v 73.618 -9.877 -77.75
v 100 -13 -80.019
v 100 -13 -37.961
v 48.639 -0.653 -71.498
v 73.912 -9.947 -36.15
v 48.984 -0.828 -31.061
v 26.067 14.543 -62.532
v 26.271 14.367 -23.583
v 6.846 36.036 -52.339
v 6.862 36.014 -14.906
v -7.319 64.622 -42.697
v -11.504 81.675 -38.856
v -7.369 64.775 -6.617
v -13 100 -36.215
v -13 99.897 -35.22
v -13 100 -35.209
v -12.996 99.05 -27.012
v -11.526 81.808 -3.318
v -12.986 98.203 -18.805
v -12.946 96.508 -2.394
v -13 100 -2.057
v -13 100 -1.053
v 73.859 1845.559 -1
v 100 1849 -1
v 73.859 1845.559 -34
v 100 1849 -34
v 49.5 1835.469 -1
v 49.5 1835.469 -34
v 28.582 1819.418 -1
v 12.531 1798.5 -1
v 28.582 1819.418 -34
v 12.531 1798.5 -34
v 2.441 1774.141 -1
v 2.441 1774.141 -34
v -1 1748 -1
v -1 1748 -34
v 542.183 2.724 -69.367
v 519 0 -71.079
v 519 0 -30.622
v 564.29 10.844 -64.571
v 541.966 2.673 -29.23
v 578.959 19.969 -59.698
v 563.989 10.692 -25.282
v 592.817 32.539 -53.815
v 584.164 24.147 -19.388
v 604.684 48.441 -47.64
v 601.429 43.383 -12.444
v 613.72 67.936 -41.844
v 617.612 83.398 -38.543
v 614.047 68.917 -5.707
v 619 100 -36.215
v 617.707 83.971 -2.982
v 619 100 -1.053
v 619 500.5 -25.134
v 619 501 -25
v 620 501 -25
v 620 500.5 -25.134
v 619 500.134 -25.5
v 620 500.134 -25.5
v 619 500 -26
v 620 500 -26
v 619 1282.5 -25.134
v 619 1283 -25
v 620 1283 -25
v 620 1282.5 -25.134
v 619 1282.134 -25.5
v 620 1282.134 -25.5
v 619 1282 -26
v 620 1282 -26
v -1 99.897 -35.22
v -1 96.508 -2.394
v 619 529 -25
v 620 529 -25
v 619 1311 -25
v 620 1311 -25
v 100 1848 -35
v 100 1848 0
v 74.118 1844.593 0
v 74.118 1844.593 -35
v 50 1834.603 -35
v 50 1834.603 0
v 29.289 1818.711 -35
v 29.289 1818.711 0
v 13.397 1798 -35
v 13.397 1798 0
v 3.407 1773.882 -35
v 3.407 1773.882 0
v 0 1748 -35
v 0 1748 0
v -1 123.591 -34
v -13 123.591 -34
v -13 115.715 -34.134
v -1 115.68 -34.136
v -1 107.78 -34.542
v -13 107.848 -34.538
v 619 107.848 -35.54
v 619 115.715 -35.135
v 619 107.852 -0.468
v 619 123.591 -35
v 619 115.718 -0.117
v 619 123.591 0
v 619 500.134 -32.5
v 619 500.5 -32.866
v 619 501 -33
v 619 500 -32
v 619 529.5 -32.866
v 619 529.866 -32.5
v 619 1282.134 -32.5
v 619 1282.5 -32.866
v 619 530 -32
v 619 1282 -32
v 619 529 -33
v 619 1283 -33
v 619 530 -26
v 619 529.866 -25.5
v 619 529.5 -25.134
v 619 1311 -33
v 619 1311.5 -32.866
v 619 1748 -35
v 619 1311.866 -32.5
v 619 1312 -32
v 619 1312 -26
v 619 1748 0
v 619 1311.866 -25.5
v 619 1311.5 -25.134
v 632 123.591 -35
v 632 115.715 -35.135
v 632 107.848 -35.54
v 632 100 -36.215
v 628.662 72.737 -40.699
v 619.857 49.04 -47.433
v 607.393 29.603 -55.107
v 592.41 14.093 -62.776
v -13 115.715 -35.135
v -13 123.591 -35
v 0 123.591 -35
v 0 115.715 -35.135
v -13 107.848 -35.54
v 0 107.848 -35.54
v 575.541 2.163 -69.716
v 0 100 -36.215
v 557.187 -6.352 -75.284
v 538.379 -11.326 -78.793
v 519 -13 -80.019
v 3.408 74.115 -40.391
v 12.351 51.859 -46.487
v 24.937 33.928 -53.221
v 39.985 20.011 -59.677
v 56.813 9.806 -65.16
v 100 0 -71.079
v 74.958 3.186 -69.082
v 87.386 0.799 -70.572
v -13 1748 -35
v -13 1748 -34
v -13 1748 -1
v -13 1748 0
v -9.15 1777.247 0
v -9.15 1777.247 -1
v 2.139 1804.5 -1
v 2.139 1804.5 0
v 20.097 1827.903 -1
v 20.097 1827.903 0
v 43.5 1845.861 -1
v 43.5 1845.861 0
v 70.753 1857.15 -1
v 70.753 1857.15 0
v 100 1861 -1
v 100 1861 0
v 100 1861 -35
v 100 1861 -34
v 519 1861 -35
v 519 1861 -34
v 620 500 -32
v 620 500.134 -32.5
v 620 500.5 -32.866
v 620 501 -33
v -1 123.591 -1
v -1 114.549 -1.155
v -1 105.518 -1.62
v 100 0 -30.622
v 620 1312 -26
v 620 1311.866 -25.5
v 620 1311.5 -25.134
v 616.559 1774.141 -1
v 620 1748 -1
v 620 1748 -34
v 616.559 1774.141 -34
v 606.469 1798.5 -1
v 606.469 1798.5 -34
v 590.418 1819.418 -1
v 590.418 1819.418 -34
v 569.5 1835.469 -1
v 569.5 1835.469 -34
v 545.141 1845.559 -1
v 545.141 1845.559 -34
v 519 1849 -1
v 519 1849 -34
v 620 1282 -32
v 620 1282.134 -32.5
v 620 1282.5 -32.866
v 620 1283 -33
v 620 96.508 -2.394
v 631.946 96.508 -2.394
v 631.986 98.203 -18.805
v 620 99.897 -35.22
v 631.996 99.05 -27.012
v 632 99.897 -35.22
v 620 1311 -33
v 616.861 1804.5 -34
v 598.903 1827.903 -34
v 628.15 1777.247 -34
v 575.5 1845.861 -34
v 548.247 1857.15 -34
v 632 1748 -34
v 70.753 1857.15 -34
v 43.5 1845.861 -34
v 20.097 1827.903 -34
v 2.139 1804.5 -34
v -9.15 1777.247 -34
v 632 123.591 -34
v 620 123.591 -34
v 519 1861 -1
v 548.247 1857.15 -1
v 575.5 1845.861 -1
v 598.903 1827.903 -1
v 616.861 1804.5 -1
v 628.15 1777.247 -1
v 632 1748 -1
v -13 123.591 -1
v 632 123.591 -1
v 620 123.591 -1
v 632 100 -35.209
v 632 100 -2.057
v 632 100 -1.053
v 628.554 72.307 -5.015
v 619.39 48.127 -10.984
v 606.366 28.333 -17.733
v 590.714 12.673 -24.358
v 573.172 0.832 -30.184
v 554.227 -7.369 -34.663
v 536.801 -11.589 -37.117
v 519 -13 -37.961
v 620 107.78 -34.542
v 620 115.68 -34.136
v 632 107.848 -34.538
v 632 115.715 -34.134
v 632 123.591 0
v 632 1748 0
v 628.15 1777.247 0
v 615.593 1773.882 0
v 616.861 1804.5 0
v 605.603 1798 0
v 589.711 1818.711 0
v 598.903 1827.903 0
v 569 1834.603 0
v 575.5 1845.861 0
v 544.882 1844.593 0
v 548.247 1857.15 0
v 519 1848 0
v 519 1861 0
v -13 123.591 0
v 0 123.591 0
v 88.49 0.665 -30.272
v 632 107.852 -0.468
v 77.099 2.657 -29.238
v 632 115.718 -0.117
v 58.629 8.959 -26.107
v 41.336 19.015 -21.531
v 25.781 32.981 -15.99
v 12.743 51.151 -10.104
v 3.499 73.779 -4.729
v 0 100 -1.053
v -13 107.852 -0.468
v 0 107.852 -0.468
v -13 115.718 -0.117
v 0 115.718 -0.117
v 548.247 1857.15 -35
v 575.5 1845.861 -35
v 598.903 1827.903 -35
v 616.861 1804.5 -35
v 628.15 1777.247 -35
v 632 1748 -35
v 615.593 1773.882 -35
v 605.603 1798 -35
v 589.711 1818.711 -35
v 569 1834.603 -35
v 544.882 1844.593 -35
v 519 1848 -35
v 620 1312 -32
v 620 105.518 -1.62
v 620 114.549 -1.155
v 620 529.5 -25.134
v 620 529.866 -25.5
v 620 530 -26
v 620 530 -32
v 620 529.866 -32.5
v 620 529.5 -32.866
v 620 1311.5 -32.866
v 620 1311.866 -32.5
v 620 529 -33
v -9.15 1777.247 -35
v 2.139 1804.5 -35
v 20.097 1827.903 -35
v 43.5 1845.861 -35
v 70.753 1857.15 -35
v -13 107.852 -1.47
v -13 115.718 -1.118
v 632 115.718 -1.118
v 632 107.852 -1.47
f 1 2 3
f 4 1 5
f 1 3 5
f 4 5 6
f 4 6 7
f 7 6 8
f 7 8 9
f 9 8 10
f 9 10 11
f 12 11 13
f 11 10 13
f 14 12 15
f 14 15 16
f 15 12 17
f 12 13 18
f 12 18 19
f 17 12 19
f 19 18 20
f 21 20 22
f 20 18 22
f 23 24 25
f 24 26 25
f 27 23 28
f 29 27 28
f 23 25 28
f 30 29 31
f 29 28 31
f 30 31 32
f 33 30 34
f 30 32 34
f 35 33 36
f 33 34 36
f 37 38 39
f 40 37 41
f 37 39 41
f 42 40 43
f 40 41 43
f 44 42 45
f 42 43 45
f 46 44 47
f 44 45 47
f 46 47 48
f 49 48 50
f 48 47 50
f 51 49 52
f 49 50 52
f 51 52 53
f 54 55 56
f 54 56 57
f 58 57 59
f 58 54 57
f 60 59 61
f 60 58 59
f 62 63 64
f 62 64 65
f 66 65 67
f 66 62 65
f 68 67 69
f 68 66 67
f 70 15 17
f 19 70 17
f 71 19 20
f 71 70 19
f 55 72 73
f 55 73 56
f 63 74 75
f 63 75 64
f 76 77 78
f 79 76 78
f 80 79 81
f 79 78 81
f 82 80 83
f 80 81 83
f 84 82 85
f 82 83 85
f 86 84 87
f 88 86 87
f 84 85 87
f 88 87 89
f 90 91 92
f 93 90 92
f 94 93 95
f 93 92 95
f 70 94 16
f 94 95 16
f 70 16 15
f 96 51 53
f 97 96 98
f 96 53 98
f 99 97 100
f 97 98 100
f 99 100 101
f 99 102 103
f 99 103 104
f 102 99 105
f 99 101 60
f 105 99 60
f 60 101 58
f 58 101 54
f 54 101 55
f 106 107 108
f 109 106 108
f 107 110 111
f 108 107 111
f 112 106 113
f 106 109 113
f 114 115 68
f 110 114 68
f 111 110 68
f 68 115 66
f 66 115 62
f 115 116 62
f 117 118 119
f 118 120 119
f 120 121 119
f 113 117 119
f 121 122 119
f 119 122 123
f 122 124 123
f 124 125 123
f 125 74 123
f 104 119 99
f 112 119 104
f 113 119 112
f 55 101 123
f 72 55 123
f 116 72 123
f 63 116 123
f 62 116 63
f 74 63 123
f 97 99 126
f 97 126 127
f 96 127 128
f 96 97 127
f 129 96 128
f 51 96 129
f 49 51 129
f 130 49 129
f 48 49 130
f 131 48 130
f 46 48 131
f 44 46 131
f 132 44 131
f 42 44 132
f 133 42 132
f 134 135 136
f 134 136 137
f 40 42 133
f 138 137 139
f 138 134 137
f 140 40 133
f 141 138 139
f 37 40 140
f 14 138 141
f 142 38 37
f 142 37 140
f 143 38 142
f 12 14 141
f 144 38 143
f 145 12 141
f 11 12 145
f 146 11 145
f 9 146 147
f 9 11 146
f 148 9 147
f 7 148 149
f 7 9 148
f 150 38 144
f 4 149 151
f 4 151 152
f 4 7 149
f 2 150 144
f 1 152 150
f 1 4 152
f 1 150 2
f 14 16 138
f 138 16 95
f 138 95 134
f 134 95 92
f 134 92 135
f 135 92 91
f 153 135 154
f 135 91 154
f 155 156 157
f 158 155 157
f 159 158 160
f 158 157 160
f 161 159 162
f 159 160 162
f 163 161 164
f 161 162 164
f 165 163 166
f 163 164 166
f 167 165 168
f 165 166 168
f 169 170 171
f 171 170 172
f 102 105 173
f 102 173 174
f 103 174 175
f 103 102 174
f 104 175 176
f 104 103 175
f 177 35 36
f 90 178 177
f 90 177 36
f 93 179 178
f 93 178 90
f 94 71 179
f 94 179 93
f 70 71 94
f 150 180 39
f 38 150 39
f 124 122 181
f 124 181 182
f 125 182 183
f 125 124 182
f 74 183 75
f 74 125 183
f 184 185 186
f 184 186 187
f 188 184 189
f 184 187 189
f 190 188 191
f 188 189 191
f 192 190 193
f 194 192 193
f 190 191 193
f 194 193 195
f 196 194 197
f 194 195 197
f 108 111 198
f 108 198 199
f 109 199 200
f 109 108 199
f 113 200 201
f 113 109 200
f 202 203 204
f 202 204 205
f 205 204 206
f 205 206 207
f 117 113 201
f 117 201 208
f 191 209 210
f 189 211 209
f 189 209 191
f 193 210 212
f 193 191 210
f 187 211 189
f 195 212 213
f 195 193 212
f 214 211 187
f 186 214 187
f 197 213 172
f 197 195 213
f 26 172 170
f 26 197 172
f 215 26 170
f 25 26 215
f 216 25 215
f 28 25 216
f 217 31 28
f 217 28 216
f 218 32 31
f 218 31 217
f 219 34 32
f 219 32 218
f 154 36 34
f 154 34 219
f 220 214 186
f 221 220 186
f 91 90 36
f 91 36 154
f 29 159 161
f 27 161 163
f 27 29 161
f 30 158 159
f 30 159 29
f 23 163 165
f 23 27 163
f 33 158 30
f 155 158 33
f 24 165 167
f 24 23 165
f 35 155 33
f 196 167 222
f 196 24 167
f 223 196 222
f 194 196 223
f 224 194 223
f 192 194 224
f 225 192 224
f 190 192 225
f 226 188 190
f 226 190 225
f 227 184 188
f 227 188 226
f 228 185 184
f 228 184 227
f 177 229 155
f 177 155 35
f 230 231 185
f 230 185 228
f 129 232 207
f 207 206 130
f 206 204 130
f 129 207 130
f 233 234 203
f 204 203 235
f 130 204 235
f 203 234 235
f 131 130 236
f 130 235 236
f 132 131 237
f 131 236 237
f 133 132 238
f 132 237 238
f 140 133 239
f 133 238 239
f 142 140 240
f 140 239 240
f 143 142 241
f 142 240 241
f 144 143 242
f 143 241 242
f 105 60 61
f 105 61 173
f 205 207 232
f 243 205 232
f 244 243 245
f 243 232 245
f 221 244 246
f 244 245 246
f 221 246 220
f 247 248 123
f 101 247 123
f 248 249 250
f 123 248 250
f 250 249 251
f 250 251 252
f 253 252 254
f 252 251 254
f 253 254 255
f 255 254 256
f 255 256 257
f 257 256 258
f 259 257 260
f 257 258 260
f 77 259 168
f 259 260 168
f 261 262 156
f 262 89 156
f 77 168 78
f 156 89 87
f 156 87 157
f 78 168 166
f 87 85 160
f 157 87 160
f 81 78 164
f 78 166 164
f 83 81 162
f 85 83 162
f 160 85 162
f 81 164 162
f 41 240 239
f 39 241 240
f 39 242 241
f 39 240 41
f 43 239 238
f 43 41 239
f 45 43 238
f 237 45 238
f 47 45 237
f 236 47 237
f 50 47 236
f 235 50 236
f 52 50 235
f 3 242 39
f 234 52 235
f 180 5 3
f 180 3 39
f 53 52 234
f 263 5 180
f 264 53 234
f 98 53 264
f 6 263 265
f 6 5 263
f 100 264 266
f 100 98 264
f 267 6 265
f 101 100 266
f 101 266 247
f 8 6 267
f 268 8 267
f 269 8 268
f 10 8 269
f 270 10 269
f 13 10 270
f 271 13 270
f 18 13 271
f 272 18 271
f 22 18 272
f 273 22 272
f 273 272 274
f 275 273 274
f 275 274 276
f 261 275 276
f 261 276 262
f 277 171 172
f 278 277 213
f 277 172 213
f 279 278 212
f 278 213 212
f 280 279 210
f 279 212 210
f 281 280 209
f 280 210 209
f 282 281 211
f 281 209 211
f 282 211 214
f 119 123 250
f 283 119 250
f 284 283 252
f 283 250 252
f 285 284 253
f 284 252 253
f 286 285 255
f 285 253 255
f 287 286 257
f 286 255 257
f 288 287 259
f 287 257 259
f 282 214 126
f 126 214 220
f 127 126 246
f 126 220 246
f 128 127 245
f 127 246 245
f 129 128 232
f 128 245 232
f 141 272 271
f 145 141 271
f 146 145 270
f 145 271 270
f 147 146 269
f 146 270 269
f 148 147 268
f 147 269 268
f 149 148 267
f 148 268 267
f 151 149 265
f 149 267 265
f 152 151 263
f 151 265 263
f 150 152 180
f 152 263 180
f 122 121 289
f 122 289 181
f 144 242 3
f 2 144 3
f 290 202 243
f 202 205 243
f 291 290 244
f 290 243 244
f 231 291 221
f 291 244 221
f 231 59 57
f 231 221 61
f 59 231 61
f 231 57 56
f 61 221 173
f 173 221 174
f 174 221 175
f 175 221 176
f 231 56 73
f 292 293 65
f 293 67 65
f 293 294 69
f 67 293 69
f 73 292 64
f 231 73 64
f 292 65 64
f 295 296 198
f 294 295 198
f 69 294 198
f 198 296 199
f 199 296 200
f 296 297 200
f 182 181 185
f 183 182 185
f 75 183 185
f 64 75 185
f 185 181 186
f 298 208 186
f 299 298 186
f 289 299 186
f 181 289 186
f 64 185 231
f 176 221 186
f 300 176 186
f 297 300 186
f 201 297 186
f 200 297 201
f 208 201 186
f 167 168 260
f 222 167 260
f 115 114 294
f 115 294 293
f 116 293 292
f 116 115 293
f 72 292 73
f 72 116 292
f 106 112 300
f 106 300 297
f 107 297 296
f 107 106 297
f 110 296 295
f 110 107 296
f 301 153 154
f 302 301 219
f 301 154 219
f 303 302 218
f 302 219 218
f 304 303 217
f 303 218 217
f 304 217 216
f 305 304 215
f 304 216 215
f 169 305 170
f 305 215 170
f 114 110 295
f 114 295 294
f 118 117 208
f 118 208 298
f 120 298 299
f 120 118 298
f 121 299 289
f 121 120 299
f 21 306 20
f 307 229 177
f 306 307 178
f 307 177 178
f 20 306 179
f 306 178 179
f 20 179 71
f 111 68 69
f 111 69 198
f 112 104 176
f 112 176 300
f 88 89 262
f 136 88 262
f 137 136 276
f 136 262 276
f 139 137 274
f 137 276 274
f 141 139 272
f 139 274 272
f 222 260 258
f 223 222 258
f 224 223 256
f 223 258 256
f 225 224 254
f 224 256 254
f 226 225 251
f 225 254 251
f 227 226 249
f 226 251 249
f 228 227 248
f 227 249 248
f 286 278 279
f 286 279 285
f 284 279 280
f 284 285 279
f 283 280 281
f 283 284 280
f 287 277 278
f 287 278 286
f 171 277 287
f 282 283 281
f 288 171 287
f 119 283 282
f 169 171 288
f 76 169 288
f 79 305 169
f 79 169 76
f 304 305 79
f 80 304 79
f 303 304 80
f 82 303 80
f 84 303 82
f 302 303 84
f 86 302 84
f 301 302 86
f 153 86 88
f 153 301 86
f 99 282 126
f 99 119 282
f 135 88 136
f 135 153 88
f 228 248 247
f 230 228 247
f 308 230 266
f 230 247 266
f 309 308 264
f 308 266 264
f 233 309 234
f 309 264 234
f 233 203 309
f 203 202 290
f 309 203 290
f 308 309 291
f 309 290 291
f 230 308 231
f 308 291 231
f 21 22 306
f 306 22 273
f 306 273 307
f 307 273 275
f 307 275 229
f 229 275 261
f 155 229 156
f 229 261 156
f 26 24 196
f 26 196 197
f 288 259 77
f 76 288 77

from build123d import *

# Parameters (mm, degrees)
BOSS_EXTRUDE1_DEPTH     = 100
CUT_EXTRUDE1_DEPTH      = 1968.929114577
CUT_EXTRUDE1_DEPTH_BACK = 1968.929114577
SKETCH3_W               = 33
SKETCH3_H               = 12
CAVITY1_START           = 619
CAVITY1_DEPTH           = 1


# Read off the part's stored shape, not the designer's step: Cavity1
with BuildPart() as part:
    # Sketch1 → Boss-Extrude1 (new body)
    with BuildSketch(Plane.XY):
        with BuildLine():
            Line((-13, 100), (-13, 1748))
            ThreePointArc((-13, 1748), (20.096933726, 1827.903066274), (100, 1861))
            Line((100, 1861), (519, 1861))
            ThreePointArc((519, 1861), (598.903066274, 1827.903066274), (632, 1748))
            Line((632, 1748), (632, 100))
            ThreePointArc((632, 100), (598.903066274, 20.096933726), (519, -13))
            Line((519, -13), (100, -13))
            ThreePointArc((100, -13), (20.096933726, 20.096933726), (-13, 100))
        make_face()
        with BuildLine():
            Line((100, 0), (519, 0))
            ThreePointArc((519, 0), (589.710678119, 29.289321881), (619, 100))
            Line((619, 100), (619, 1748))
            ThreePointArc((619, 1748), (589.710678119, 1818.710678119), (519, 1848))
            Line((519, 1848), (100, 1848))
            ThreePointArc((100, 1848), (29.289321881, 1818.710678119), (0, 1748))
            Line((0, 1748), (0, 100))
            ThreePointArc((0, 100), (29.289321881, 29.289321881), (100, 0))
        make_face(mode=Mode.SUBTRACT)
    extrude(amount=-BOSS_EXTRUDE1_DEPTH)

    # Sketch2 → Cut-Extrude1 (cut, two sides: drawn at the far end of the back side and taken through both)
    with BuildSketch(Plane(origin=(0, 0, 0), x_dir=(0, 0, -1), z_dir=(1, 0, 0)).offset(-CUT_EXTRUDE1_DEPTH_BACK)):
        with BuildLine():
            Line((100, 1861), (35, 1861))
            Line((35, 1861), (35, 123.590579564))
            ThreePointArc((35, 123.590579564), (51.869398873, 37.185139921), (100, -36.53))
            Line((100, -36.53), (100, 1861))
        make_face()
        with BuildLine():
            Line((0, -36.53), (53.916588263, -36.53))
            ThreePointArc((53.916588263, -36.53), (13.84098777, 39.113365936), (0, 123.590579564))
            Line((0, 123.590579564), (0, -36.53))
        make_face()
    extrude(amount=CUT_EXTRUDE1_DEPTH + CUT_EXTRUDE1_DEPTH_BACK, mode=Mode.SUBTRACT)

    # Cut-Sweep1: sweep along a curve in space
    with BuildLine() as cut_sweep1_path:
        ThreePointArc((-13, 123.590579564, -35), (-13, 111.779668745, -35.303826234), (-13, 100, -36.214501257))
        Line((-13, 1748, -35), (-13, 123.590579564, -35))
        ThreePointArc((100, 1861, -35), (20.096933726, 1827.903066274, -35), (-13, 1748, -35))
        Line((519, 1861, -35), (100, 1861, -35))
        ThreePointArc((632, 1748, -35), (598.903066274, 1827.903066274, -35), (519, 1861, -35))
        Line((632, 1748, -35), (632, 123.590579564, -35))
        ThreePointArc((632, 123.590579564, -35), (632, 111.779668745, -35.303826234), (632, 100, -36.214501257))
    # Sketch3 → Cut-Sweep1 (sweep, cut)
    with BuildSketch(Plane(origin=(309.5, 0, 0), x_dir=(0, 0, -1), z_dir=(1, 0, 0))):
        with Locations((17.5, 1855)):
            Rectangle(SKETCH3_W, SKETCH3_H)
    sweep(path=cut_sweep1_path.line, mode=Mode.SUBTRACT)

    # Cavity1 outline → Cavity1 (cut)
    with BuildSketch(Plane.YZ.offset(CAVITY1_START)):
        with BuildLine():
            ThreePointArc((1311, -33), (1311.707106781, -32.707106781), (1312, -32))
            Line((1312, -32), (1312, -26))
            ThreePointArc((1312, -26), (1311.707106781, -25.292893219), (1311, -25))
            Line((1311, -25), (1283, -25))
            ThreePointArc((1283, -25), (1282.292893219, -25.292893219), (1282, -26))
            Line((1282, -26), (1282, -32))
            ThreePointArc((1282, -32), (1282.292893219, -32.707106781), (1283, -33))
            Line((1283, -33), (1311, -33))
        make_face()
        with BuildLine():
            Line((501, -33), (529, -33))
            ThreePointArc((529, -33), (529.707106781, -32.707106781), (530, -32))
            Line((530, -32), (530, -26))
            ThreePointArc((530, -26), (529.707106781, -25.292893219), (529, -25))
            Line((529, -25), (501, -25))
            ThreePointArc((501, -25), (500.292893219, -25.292893219), (500, -26))
            Line((500, -26), (500, -32))
            ThreePointArc((500, -32), (500.292893219, -32.707106781), (501, -33))
        make_face()
    extrude(amount=CAVITY1_DEPTH, mode=Mode.SUBTRACT)


solid = part.part
